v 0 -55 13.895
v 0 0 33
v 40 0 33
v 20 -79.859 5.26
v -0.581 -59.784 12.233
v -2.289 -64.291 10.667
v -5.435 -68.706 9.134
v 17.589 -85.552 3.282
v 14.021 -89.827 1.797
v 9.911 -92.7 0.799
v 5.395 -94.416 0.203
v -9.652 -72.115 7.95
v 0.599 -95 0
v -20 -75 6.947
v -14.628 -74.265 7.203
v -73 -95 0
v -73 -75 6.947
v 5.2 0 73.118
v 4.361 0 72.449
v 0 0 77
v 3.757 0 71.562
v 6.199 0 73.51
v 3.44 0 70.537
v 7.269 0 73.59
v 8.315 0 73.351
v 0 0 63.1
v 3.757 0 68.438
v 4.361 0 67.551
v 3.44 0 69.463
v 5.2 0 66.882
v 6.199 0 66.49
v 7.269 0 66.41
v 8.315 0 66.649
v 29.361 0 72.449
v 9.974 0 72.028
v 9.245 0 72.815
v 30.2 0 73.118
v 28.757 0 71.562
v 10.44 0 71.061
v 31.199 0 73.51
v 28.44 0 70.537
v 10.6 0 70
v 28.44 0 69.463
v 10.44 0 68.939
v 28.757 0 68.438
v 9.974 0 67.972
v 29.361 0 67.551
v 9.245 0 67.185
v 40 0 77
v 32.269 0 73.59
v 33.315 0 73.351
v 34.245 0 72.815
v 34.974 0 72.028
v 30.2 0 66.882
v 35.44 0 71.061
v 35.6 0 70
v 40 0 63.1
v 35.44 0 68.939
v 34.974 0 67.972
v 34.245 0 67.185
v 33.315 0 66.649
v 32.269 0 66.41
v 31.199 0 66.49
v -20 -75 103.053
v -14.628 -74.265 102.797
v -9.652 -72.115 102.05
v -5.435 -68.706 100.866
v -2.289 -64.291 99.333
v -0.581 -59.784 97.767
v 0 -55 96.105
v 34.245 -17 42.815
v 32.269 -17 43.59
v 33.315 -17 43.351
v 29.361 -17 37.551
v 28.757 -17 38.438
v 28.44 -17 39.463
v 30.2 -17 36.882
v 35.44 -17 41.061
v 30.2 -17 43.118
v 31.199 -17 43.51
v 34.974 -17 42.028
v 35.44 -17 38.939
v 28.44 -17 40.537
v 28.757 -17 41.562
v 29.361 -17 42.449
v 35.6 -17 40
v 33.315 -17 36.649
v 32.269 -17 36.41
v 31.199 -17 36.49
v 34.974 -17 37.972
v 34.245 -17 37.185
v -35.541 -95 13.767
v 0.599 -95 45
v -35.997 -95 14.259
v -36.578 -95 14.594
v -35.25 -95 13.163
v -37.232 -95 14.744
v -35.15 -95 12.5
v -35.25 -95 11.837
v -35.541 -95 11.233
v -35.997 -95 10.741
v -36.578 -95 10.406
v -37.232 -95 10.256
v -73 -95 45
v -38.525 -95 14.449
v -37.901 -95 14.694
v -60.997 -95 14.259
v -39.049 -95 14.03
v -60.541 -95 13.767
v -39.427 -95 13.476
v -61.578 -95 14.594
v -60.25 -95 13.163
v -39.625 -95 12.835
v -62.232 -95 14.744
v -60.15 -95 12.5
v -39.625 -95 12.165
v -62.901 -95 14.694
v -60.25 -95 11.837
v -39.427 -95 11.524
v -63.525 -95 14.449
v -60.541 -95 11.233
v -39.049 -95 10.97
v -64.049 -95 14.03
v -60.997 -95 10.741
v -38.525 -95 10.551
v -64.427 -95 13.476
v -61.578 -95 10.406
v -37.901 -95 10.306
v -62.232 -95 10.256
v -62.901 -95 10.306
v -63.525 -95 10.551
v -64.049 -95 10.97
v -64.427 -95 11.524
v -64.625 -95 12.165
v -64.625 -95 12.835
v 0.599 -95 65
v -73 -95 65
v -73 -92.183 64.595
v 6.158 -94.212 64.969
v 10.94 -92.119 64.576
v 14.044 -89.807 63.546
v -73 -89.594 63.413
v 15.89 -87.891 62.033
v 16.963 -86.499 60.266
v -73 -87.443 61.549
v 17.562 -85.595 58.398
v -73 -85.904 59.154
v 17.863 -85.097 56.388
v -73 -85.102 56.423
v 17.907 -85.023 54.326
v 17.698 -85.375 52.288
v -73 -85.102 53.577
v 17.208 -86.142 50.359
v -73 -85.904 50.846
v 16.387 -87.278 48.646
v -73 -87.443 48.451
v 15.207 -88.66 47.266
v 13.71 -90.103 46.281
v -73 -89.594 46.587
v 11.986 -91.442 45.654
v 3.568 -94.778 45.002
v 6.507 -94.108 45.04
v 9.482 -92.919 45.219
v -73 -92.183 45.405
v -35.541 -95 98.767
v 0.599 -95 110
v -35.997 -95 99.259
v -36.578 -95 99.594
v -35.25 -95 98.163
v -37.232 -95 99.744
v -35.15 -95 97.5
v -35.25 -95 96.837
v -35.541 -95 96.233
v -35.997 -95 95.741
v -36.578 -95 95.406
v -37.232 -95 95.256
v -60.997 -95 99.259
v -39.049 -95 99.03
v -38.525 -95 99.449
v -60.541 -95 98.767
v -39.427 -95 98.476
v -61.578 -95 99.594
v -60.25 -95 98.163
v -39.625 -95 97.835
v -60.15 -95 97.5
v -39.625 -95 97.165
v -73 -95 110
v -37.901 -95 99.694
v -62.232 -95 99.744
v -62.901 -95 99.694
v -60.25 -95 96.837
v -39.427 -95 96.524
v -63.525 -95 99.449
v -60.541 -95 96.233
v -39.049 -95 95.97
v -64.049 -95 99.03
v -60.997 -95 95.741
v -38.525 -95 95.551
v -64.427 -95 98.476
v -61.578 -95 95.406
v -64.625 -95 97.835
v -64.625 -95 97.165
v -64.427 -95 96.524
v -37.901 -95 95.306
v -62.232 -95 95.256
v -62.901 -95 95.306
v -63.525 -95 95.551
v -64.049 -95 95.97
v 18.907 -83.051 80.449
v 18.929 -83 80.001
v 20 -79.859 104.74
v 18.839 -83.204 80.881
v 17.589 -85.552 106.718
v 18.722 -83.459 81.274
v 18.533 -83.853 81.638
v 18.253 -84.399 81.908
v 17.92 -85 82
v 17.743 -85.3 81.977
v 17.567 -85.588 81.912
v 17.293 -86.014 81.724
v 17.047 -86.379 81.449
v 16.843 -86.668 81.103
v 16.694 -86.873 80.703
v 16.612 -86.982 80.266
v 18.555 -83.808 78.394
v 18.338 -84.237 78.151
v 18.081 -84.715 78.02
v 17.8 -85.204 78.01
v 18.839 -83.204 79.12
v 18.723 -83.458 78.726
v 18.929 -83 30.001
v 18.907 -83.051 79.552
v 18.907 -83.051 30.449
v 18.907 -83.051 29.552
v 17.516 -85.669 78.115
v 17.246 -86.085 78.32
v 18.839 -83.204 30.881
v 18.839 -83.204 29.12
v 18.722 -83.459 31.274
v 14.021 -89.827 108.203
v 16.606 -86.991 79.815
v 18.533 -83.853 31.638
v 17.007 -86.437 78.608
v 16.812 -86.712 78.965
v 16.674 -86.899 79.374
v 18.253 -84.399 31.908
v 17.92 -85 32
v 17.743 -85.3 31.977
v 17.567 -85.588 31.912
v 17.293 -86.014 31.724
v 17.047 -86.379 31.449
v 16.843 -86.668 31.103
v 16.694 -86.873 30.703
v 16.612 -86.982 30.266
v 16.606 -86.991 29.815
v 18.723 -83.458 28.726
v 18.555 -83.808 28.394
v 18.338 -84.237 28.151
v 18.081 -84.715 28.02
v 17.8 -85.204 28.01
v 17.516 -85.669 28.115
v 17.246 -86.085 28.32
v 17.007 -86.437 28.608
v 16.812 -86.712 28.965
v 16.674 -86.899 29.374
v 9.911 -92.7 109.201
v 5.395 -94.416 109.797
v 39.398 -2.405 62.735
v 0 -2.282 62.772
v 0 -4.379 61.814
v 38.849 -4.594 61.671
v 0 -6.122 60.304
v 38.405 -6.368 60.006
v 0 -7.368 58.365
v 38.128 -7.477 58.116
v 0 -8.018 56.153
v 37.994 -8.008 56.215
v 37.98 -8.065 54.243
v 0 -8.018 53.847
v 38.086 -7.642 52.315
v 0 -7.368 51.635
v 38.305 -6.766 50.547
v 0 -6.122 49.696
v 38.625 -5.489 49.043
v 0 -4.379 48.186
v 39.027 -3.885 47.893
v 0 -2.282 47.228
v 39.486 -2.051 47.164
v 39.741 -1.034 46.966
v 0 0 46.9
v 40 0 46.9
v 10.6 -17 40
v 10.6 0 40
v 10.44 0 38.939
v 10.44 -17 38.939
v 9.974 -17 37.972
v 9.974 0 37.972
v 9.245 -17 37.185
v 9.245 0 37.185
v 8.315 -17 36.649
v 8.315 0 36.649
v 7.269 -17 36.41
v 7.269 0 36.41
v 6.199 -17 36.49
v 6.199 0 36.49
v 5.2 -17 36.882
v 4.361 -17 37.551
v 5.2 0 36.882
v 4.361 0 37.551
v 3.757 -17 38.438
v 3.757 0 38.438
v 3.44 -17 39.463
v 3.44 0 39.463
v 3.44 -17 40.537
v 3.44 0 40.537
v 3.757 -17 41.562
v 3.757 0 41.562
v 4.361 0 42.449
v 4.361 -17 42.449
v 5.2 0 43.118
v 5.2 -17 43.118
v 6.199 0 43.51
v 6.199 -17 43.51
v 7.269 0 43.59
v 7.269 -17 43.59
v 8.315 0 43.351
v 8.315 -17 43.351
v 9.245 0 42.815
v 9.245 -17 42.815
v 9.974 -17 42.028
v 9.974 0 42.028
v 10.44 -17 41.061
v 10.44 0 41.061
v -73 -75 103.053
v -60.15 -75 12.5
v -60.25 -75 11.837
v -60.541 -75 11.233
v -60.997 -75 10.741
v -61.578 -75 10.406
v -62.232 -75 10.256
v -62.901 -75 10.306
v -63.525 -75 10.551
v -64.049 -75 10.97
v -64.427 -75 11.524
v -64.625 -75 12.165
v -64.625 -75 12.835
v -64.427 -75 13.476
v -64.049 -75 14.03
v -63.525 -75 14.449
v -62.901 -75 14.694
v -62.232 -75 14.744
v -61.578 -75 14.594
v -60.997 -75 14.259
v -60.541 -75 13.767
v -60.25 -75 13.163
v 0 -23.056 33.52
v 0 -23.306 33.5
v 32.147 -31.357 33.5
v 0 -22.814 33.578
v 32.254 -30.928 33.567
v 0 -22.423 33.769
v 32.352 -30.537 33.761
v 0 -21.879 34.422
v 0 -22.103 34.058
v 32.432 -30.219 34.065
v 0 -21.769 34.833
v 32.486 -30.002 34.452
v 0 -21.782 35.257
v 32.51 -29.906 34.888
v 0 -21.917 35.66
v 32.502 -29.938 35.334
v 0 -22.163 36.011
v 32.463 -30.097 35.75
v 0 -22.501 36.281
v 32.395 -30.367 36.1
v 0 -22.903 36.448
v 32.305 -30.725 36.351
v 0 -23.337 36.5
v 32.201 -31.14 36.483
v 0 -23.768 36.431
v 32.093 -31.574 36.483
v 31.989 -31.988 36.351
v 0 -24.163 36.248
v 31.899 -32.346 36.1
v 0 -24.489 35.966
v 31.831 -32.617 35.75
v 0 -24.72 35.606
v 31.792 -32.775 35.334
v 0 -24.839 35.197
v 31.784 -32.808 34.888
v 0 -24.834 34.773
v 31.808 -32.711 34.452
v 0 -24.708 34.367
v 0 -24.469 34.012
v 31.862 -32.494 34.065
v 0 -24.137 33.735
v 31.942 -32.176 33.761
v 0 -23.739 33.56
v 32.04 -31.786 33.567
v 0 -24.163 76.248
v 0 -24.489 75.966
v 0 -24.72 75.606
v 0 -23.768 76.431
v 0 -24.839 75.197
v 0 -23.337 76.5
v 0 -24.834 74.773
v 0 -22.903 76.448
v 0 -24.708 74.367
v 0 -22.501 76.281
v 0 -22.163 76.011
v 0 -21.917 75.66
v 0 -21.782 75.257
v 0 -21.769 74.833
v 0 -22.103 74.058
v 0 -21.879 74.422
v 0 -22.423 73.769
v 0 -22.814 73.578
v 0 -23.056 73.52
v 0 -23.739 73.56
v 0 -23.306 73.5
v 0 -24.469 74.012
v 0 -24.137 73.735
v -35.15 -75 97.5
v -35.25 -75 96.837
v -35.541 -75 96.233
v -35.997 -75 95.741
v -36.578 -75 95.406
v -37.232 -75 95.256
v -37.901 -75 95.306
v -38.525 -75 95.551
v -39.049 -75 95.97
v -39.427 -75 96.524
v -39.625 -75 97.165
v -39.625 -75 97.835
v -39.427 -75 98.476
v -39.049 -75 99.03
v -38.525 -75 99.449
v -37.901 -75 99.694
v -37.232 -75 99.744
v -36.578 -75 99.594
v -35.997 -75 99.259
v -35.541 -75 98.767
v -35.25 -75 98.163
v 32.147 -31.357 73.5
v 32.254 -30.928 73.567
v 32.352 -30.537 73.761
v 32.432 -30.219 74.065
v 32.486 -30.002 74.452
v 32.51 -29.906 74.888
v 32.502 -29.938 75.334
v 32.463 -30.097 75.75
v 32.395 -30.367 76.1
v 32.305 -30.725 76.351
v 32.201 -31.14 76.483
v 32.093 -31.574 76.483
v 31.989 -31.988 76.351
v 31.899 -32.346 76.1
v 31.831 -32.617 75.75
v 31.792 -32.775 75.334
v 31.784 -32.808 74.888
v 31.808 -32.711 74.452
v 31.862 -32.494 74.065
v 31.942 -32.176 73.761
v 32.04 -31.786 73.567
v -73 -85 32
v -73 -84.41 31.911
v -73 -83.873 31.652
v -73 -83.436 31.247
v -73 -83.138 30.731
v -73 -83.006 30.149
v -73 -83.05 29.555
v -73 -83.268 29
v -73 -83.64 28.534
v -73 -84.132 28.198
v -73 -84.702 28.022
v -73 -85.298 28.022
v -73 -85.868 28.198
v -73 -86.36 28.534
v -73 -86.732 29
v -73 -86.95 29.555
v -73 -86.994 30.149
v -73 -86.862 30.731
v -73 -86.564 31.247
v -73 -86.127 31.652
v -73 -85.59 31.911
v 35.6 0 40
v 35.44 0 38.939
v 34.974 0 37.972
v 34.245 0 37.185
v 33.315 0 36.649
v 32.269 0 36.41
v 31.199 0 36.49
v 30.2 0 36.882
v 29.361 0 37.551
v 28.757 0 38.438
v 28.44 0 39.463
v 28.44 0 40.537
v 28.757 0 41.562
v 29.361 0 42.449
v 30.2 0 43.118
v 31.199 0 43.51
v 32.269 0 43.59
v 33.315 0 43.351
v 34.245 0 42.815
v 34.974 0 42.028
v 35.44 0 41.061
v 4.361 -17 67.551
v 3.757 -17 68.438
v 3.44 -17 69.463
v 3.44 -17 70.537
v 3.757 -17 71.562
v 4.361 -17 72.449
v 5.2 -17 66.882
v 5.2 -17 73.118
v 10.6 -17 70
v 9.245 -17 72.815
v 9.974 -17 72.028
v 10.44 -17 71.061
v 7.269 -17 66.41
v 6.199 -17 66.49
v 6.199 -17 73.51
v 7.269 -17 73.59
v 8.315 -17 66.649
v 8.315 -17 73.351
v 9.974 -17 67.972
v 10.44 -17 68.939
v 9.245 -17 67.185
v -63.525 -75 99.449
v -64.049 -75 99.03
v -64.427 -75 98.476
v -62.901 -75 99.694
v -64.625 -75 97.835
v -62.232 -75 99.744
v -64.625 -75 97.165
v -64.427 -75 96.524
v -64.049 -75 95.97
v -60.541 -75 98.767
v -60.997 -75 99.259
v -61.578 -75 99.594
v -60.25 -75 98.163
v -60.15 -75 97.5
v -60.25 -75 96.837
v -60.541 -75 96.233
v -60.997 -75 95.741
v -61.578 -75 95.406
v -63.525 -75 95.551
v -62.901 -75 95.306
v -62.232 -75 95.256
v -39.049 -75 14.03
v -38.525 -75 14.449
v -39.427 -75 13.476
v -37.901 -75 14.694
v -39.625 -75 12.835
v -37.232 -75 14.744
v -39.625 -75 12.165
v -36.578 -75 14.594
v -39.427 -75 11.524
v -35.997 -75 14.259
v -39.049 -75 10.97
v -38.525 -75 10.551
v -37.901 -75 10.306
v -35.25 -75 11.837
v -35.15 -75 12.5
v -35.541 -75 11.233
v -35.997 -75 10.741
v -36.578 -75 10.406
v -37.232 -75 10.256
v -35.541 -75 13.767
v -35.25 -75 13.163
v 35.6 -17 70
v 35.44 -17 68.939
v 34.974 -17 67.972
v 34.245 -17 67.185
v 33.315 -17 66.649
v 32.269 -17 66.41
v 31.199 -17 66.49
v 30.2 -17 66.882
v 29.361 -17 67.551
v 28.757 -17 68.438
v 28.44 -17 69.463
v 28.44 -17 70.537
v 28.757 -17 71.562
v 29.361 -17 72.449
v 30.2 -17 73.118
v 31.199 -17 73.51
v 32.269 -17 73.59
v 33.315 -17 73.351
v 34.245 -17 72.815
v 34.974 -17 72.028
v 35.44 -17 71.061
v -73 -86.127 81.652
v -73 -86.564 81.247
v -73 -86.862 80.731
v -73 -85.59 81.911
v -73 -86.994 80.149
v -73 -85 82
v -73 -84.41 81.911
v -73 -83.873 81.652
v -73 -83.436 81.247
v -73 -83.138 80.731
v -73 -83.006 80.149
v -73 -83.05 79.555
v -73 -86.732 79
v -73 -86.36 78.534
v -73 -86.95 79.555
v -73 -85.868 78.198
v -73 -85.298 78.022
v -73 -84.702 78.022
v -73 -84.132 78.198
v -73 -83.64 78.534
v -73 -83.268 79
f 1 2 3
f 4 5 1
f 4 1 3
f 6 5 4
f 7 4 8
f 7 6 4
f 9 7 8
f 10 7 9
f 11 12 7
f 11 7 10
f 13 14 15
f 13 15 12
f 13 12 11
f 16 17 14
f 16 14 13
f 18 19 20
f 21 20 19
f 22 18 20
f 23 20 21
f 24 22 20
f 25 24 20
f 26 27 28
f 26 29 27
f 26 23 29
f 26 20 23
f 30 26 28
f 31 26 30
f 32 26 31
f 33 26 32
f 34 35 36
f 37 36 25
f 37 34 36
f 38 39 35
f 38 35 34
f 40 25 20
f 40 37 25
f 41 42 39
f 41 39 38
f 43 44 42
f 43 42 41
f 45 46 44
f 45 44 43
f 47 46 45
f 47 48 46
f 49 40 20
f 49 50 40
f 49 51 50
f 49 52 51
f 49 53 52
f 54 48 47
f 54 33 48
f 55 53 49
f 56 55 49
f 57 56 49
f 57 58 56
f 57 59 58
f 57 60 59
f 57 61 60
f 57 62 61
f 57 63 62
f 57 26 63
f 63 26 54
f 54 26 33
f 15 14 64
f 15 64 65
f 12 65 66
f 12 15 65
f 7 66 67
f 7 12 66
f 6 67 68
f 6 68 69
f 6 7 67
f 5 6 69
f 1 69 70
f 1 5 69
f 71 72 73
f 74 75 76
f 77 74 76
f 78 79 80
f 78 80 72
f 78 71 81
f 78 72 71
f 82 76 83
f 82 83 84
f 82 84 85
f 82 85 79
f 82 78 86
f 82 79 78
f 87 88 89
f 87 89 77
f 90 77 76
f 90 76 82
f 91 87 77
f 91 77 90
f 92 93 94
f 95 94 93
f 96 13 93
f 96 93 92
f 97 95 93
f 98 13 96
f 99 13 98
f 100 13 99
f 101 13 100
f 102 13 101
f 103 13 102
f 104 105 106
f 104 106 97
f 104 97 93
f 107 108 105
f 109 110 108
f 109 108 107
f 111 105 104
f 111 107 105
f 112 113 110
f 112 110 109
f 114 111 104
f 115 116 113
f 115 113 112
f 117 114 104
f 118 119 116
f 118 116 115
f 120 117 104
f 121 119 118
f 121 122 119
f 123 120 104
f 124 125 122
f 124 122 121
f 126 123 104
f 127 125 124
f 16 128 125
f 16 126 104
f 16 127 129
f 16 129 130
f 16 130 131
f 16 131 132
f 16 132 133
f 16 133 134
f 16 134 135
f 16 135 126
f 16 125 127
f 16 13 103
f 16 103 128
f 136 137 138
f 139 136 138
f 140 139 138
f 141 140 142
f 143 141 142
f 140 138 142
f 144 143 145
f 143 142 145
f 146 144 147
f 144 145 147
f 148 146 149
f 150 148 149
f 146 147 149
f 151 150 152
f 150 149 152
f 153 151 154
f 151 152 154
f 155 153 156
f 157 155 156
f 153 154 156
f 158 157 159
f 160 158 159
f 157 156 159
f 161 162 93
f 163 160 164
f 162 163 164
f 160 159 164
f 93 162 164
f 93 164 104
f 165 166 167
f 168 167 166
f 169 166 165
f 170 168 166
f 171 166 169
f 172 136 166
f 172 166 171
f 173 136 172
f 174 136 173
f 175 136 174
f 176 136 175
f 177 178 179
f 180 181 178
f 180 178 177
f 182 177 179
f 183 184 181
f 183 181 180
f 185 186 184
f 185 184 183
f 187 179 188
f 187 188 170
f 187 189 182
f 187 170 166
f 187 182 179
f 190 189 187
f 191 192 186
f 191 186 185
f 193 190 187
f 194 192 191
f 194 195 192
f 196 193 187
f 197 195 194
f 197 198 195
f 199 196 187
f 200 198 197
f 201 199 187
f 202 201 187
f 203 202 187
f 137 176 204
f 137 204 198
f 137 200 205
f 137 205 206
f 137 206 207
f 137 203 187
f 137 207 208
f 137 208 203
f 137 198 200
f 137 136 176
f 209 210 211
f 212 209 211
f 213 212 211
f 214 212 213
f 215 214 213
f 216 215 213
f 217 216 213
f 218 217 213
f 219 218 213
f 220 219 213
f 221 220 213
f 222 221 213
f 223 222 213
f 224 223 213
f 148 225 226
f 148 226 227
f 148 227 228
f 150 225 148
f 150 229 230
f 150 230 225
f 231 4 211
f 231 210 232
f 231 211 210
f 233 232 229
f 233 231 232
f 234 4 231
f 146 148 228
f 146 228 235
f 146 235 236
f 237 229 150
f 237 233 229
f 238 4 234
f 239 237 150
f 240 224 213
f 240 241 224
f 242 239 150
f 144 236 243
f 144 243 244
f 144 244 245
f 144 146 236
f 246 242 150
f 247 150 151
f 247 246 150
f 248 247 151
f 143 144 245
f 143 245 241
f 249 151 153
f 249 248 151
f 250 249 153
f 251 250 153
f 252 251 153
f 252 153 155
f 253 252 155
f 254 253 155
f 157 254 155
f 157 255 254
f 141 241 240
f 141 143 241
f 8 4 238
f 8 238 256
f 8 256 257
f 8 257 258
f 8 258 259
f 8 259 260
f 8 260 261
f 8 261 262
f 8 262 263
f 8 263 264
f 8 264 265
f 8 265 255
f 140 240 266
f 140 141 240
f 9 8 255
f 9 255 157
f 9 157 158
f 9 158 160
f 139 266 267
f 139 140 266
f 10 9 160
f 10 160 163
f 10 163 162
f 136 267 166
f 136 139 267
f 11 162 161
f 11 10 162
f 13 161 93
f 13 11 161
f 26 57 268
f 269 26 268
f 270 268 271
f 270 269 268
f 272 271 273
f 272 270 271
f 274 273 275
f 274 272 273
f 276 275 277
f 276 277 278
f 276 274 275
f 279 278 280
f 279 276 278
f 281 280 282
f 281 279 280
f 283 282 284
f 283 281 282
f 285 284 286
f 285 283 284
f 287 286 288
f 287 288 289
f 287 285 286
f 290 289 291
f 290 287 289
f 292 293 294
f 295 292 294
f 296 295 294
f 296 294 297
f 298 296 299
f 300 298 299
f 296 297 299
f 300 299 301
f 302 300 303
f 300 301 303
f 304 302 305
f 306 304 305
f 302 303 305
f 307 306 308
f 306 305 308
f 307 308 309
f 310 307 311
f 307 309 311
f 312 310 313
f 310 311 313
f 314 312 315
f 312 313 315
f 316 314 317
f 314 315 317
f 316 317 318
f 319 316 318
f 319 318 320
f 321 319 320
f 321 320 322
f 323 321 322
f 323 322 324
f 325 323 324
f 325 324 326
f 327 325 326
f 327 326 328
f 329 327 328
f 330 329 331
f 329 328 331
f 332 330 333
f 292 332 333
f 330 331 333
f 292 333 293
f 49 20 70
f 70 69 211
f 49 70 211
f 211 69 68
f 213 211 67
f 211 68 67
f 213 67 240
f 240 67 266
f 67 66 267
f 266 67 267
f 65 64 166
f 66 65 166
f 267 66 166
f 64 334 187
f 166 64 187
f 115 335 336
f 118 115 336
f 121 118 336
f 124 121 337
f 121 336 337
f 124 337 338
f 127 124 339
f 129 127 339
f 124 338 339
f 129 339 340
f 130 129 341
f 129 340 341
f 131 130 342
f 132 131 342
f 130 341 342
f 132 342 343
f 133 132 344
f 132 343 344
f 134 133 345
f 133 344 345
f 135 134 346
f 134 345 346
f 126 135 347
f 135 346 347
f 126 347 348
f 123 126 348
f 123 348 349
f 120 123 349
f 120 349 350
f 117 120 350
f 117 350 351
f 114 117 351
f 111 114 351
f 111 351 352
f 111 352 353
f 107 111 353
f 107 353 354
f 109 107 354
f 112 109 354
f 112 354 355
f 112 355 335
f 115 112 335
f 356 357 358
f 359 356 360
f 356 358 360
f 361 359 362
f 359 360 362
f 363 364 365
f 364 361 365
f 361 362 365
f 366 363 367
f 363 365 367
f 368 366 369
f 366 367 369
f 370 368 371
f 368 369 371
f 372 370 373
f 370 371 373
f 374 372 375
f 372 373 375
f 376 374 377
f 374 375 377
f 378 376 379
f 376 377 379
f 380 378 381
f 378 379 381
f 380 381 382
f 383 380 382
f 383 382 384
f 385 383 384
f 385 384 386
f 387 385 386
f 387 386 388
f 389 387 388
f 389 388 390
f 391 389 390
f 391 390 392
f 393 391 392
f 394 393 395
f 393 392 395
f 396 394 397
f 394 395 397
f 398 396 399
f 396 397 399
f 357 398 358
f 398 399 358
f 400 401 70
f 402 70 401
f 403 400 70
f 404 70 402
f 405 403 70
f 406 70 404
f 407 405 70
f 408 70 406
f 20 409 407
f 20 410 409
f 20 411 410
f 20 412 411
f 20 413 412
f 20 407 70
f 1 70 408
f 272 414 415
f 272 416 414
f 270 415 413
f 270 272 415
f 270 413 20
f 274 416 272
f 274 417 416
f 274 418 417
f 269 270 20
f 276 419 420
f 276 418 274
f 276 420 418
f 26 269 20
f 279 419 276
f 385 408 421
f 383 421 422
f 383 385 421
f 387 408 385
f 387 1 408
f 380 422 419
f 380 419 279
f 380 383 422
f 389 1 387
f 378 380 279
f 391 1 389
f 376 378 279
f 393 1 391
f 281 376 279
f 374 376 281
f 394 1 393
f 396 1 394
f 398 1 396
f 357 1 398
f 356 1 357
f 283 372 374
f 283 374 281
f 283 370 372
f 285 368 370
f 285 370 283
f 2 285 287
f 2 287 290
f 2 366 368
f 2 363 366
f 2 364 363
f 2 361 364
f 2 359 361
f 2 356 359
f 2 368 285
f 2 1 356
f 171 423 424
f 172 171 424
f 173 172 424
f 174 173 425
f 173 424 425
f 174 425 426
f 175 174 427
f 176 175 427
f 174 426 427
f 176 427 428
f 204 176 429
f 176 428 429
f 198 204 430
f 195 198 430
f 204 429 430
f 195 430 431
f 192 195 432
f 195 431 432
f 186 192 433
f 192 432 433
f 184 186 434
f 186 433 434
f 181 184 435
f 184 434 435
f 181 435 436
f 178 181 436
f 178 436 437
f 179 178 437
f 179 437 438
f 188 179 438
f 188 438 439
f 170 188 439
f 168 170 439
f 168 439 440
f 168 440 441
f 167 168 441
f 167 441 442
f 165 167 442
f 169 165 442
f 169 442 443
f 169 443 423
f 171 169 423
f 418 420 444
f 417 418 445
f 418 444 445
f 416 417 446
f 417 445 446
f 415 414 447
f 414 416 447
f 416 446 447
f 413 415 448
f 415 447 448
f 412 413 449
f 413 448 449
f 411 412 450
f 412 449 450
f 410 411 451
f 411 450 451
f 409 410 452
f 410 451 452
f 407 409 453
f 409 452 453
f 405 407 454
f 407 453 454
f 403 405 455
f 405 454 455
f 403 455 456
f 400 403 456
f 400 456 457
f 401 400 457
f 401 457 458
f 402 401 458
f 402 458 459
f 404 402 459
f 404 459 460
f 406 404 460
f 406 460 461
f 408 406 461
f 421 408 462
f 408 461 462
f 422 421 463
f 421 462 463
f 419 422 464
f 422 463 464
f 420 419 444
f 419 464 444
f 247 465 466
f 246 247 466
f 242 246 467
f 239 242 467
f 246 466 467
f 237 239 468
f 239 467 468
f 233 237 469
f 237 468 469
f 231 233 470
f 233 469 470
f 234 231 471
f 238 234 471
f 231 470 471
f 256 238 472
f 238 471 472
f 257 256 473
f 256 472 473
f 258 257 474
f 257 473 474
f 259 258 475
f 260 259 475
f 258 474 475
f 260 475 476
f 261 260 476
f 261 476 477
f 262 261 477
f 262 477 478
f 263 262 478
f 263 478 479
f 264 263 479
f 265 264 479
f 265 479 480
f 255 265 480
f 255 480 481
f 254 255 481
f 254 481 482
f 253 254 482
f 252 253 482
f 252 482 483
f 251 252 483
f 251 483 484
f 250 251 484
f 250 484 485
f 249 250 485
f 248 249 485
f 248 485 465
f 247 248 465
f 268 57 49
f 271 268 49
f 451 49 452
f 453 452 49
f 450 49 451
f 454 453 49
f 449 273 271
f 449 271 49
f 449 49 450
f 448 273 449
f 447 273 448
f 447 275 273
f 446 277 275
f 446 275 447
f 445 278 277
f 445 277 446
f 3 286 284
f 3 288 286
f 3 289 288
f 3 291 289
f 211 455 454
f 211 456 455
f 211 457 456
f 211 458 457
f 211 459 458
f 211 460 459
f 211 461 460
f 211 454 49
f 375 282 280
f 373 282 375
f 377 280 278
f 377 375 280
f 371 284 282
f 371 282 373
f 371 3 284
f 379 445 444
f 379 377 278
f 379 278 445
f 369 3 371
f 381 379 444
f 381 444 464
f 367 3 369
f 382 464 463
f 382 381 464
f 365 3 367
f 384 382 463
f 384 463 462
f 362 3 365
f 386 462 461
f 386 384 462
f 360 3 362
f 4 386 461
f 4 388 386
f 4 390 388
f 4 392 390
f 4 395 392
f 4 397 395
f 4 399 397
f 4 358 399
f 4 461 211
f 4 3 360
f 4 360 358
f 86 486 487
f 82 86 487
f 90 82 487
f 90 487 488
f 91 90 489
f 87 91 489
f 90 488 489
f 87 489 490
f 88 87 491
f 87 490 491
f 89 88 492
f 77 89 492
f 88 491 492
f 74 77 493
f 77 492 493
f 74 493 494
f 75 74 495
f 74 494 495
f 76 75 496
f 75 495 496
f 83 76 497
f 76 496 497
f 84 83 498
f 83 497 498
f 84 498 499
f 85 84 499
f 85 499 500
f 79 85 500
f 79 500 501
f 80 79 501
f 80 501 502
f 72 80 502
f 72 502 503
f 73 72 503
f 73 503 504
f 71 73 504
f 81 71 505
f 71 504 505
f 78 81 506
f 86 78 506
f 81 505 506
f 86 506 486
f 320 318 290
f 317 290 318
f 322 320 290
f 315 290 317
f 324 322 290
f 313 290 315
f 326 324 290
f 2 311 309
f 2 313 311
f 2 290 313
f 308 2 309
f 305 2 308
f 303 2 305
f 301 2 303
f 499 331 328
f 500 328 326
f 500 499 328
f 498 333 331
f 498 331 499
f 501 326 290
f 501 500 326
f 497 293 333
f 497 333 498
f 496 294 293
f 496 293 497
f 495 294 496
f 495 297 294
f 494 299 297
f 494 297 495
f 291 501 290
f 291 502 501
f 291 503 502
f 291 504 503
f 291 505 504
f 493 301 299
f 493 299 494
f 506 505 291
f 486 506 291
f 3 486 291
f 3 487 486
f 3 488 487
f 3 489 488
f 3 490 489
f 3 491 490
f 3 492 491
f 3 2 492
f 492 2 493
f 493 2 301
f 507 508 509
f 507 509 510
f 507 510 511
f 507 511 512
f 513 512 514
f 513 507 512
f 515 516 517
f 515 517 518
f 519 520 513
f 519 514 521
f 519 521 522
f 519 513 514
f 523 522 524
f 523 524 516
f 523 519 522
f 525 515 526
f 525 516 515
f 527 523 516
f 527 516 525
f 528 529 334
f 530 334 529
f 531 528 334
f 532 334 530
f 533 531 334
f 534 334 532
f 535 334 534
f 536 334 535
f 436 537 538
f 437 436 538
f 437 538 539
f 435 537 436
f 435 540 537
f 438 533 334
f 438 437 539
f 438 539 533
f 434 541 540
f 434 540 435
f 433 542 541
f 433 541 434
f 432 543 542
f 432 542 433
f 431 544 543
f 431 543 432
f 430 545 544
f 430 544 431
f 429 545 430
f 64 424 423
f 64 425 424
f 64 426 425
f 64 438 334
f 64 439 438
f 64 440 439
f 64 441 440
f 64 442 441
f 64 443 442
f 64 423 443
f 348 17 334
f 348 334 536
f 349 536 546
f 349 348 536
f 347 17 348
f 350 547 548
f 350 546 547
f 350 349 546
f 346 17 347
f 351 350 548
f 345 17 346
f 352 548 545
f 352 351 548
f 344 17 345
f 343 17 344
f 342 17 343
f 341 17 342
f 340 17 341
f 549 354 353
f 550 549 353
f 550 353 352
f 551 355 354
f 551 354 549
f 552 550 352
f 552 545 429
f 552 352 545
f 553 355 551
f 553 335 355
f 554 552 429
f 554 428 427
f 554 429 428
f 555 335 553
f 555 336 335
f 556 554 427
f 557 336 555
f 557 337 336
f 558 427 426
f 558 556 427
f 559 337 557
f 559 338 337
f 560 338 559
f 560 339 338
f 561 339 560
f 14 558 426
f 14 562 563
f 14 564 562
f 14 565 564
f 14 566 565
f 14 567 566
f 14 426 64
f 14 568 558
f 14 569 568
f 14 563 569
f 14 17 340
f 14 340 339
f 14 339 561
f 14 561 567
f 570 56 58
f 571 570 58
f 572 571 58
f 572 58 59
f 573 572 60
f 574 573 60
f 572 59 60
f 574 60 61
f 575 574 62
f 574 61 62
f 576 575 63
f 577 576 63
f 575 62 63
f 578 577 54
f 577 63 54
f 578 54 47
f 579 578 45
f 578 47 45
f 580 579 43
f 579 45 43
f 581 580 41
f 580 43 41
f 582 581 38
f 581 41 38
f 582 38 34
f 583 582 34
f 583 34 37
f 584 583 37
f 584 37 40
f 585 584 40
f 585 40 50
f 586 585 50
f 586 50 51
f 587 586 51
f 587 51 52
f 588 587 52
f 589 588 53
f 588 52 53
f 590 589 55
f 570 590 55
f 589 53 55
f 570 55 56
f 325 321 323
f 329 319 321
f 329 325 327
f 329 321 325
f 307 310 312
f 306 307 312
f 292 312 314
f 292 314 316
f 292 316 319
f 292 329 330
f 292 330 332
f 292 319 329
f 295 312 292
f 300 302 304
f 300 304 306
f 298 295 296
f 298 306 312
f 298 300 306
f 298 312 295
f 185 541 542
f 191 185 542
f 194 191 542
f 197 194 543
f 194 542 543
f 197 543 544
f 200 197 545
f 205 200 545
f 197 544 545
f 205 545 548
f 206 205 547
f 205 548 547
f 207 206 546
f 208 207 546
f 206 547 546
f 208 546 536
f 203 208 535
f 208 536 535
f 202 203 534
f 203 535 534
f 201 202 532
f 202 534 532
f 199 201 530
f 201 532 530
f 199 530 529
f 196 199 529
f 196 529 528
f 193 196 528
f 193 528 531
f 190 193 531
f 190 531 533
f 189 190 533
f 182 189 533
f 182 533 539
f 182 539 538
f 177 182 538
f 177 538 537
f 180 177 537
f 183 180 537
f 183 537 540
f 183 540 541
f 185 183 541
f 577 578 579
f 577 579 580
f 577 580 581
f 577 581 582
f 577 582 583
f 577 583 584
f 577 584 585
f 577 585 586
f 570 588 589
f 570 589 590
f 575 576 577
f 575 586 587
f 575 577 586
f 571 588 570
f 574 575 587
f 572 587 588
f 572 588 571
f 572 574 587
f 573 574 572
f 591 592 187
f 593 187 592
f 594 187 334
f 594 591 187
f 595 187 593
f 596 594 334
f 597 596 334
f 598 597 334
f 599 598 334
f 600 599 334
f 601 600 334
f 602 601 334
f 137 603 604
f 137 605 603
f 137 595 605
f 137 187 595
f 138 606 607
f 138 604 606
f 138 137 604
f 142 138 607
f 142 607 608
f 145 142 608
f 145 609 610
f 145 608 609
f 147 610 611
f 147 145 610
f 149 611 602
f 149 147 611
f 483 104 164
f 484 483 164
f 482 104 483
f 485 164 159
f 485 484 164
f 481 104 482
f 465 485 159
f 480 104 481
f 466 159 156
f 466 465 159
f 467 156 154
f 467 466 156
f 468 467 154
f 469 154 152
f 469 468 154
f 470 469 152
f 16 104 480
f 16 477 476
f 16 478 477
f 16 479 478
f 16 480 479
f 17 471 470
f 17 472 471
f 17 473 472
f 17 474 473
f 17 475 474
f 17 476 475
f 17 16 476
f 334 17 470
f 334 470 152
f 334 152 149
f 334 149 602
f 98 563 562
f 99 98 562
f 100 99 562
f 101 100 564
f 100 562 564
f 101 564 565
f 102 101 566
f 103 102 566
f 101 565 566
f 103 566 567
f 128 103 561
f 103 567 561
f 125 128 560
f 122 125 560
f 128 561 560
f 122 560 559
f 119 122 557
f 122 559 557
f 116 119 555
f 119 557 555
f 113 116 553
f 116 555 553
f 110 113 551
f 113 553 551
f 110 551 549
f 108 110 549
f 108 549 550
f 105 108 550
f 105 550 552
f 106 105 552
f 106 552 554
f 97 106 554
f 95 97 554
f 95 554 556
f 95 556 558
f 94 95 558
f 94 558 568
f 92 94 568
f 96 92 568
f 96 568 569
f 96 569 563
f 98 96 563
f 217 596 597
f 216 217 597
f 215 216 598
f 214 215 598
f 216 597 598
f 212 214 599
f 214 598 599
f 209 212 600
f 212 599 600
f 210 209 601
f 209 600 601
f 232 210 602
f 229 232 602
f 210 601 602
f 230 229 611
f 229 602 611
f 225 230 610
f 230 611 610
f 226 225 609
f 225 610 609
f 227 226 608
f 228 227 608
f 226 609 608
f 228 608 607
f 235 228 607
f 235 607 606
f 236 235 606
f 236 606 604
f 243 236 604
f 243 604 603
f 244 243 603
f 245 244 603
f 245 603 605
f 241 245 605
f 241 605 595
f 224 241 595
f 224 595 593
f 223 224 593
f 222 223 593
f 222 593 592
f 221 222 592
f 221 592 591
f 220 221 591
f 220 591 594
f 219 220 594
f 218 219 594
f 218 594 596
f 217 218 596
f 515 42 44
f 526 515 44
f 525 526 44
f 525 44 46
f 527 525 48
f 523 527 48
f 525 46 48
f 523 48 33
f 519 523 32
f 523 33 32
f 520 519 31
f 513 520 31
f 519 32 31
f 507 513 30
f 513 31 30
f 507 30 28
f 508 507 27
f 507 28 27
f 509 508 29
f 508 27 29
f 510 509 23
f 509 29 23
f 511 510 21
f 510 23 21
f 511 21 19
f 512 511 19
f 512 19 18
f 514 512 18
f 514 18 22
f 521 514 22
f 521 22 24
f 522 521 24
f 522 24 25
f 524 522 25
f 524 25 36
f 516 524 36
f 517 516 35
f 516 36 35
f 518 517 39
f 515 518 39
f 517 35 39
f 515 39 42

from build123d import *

# Parameters (mm, degrees)
BOSS_EXTRUDE1_DEPTH     = 110
SKETCH2_R               = 8.1
CUT_EXTRUDE1_DEPTH      = 41
CUT_EXTRUDE2_DEPTH      = 74
CUT_EXTRUDE2_DEPTH_BACK = 41
SKETCH3_R               = 2.25
CUT_EXTRUDE3_DEPTH      = 21
SKETCH5_R               = 3.6
CUT_EXTRUDE4_DEPTH      = 17
SKETCH6_R               = 10
SKETCH6_R_2             = 2
CUT_EXTRUDE5_DEPTH      = 149
SKETCH7_R               = 1.5
CUT_EXTRUDE6_DEPTH      = 43


with BuildPart() as part:
    # Sketch1 → Boss-Extrude1 (new body)
    with BuildSketch(Plane.XY):
        with BuildLine():
            Line((0, 0), (40, 0))
            Line((40, 0), (20, -79.858784278))
            ThreePointArc((20, -79.858784278), (12.904134464, -90.766668728), (0.599169725, -95))
            Line((0.599169725, -95), (-73, -95))
            Line((-73, -95), (-73, -75))
            Line((-73, -75), (-20, -75))
            ThreePointArc((-20, -75), (-5.857864376, -69.142135624), (0, -55))
            Line((0, -55), (0, 0))
        make_face()
    extrude(amount=BOSS_EXTRUDE1_DEPTH)

    # Sketch2 → Cut-Extrude1 (cut, through all)
    with BuildSketch(Plane(origin=(0, -4.784896585, 0), x_dir=(0, 0, -1), z_dir=(1, 0, 0))):
        with Locations((-55, 4.784896585)):
            Circle(SKETCH2_R)
    extrude(amount=CUT_EXTRUDE1_DEPTH, mode=Mode.SUBTRACT)

    # Sketch4 → Cut-Extrude2 (cut, two sides)
    with BuildSketch(Plane.ZY) as cut_extrude2_sk:
        Polygon((33, 0), (0, -95), (0, 0), align=None)
        Polygon((77, 0), (110, -95), (110, 0), align=None)
    extrude(amount=CUT_EXTRUDE2_DEPTH, mode=Mode.SUBTRACT)
    extrude(cut_extrude2_sk.sketch, amount=-CUT_EXTRUDE2_DEPTH_BACK, mode=Mode.SUBTRACT)

    # Sketch3 → Cut-Extrude3 (cut, through all)
    with BuildSketch(Plane(origin=(0, -75, 0), x_dir=(1, 0, 0), z_dir=(0, 1, 0))):
        with Locations((-62.4, -12.5)):
            Circle(SKETCH3_R)
        with Locations((-62.4, -97.5)):
            Circle(SKETCH3_R)
        with Locations((-37.4, -12.5)):
            Circle(SKETCH3_R)
        with Locations((-37.4, -97.5)):
            Circle(SKETCH3_R)
    extrude(amount=-CUT_EXTRUDE3_DEPTH, mode=Mode.SUBTRACT)

    # Sketch5 → Cut-Extrude4 (cut)
    with BuildSketch(Plane(origin=(0, 0, 0), x_dir=(1, 0, 0), z_dir=(0, 1, 0))):
        with Locations((7, -40)):
            Circle(SKETCH5_R)
        with Locations((32, -40)):
            Circle(SKETCH5_R)
        with Locations((7, -70)):
            Circle(SKETCH5_R)
        with Locations((32, -70)):
            Circle(SKETCH5_R)
    extrude(amount=-CUT_EXTRUDE4_DEPTH, mode=Mode.SUBTRACT)

    # Sketch6 → Cut-Extrude5 (cut)
    with BuildSketch(Plane.ZY.offset(73)):
        with Locations((55, -95)):
            Circle(SKETCH6_R)
        with Locations((30, -85)):
            Circle(SKETCH6_R_2)
        with Locations((80, -85)):
            Circle(SKETCH6_R_2)
    extrude(amount=-CUT_EXTRUDE5_DEPTH, mode=Mode.SUBTRACT)

    # Sketch7 → Cut-Extrude6 (cut)
    with BuildSketch(Plane(origin=(37.639221534, -9.426444911, 0), x_dir=(0, 0, -1), z_dir=(0.970041514, -0.242939214, 0))):
        with Locations((-75, -22.607551707)):
            Circle(SKETCH7_R)
        with Locations((-35, -22.607551707)):
            Circle(SKETCH7_R)
    extrude(amount=-CUT_EXTRUDE6_DEPTH, mode=Mode.SUBTRACT)


solid = part.part
